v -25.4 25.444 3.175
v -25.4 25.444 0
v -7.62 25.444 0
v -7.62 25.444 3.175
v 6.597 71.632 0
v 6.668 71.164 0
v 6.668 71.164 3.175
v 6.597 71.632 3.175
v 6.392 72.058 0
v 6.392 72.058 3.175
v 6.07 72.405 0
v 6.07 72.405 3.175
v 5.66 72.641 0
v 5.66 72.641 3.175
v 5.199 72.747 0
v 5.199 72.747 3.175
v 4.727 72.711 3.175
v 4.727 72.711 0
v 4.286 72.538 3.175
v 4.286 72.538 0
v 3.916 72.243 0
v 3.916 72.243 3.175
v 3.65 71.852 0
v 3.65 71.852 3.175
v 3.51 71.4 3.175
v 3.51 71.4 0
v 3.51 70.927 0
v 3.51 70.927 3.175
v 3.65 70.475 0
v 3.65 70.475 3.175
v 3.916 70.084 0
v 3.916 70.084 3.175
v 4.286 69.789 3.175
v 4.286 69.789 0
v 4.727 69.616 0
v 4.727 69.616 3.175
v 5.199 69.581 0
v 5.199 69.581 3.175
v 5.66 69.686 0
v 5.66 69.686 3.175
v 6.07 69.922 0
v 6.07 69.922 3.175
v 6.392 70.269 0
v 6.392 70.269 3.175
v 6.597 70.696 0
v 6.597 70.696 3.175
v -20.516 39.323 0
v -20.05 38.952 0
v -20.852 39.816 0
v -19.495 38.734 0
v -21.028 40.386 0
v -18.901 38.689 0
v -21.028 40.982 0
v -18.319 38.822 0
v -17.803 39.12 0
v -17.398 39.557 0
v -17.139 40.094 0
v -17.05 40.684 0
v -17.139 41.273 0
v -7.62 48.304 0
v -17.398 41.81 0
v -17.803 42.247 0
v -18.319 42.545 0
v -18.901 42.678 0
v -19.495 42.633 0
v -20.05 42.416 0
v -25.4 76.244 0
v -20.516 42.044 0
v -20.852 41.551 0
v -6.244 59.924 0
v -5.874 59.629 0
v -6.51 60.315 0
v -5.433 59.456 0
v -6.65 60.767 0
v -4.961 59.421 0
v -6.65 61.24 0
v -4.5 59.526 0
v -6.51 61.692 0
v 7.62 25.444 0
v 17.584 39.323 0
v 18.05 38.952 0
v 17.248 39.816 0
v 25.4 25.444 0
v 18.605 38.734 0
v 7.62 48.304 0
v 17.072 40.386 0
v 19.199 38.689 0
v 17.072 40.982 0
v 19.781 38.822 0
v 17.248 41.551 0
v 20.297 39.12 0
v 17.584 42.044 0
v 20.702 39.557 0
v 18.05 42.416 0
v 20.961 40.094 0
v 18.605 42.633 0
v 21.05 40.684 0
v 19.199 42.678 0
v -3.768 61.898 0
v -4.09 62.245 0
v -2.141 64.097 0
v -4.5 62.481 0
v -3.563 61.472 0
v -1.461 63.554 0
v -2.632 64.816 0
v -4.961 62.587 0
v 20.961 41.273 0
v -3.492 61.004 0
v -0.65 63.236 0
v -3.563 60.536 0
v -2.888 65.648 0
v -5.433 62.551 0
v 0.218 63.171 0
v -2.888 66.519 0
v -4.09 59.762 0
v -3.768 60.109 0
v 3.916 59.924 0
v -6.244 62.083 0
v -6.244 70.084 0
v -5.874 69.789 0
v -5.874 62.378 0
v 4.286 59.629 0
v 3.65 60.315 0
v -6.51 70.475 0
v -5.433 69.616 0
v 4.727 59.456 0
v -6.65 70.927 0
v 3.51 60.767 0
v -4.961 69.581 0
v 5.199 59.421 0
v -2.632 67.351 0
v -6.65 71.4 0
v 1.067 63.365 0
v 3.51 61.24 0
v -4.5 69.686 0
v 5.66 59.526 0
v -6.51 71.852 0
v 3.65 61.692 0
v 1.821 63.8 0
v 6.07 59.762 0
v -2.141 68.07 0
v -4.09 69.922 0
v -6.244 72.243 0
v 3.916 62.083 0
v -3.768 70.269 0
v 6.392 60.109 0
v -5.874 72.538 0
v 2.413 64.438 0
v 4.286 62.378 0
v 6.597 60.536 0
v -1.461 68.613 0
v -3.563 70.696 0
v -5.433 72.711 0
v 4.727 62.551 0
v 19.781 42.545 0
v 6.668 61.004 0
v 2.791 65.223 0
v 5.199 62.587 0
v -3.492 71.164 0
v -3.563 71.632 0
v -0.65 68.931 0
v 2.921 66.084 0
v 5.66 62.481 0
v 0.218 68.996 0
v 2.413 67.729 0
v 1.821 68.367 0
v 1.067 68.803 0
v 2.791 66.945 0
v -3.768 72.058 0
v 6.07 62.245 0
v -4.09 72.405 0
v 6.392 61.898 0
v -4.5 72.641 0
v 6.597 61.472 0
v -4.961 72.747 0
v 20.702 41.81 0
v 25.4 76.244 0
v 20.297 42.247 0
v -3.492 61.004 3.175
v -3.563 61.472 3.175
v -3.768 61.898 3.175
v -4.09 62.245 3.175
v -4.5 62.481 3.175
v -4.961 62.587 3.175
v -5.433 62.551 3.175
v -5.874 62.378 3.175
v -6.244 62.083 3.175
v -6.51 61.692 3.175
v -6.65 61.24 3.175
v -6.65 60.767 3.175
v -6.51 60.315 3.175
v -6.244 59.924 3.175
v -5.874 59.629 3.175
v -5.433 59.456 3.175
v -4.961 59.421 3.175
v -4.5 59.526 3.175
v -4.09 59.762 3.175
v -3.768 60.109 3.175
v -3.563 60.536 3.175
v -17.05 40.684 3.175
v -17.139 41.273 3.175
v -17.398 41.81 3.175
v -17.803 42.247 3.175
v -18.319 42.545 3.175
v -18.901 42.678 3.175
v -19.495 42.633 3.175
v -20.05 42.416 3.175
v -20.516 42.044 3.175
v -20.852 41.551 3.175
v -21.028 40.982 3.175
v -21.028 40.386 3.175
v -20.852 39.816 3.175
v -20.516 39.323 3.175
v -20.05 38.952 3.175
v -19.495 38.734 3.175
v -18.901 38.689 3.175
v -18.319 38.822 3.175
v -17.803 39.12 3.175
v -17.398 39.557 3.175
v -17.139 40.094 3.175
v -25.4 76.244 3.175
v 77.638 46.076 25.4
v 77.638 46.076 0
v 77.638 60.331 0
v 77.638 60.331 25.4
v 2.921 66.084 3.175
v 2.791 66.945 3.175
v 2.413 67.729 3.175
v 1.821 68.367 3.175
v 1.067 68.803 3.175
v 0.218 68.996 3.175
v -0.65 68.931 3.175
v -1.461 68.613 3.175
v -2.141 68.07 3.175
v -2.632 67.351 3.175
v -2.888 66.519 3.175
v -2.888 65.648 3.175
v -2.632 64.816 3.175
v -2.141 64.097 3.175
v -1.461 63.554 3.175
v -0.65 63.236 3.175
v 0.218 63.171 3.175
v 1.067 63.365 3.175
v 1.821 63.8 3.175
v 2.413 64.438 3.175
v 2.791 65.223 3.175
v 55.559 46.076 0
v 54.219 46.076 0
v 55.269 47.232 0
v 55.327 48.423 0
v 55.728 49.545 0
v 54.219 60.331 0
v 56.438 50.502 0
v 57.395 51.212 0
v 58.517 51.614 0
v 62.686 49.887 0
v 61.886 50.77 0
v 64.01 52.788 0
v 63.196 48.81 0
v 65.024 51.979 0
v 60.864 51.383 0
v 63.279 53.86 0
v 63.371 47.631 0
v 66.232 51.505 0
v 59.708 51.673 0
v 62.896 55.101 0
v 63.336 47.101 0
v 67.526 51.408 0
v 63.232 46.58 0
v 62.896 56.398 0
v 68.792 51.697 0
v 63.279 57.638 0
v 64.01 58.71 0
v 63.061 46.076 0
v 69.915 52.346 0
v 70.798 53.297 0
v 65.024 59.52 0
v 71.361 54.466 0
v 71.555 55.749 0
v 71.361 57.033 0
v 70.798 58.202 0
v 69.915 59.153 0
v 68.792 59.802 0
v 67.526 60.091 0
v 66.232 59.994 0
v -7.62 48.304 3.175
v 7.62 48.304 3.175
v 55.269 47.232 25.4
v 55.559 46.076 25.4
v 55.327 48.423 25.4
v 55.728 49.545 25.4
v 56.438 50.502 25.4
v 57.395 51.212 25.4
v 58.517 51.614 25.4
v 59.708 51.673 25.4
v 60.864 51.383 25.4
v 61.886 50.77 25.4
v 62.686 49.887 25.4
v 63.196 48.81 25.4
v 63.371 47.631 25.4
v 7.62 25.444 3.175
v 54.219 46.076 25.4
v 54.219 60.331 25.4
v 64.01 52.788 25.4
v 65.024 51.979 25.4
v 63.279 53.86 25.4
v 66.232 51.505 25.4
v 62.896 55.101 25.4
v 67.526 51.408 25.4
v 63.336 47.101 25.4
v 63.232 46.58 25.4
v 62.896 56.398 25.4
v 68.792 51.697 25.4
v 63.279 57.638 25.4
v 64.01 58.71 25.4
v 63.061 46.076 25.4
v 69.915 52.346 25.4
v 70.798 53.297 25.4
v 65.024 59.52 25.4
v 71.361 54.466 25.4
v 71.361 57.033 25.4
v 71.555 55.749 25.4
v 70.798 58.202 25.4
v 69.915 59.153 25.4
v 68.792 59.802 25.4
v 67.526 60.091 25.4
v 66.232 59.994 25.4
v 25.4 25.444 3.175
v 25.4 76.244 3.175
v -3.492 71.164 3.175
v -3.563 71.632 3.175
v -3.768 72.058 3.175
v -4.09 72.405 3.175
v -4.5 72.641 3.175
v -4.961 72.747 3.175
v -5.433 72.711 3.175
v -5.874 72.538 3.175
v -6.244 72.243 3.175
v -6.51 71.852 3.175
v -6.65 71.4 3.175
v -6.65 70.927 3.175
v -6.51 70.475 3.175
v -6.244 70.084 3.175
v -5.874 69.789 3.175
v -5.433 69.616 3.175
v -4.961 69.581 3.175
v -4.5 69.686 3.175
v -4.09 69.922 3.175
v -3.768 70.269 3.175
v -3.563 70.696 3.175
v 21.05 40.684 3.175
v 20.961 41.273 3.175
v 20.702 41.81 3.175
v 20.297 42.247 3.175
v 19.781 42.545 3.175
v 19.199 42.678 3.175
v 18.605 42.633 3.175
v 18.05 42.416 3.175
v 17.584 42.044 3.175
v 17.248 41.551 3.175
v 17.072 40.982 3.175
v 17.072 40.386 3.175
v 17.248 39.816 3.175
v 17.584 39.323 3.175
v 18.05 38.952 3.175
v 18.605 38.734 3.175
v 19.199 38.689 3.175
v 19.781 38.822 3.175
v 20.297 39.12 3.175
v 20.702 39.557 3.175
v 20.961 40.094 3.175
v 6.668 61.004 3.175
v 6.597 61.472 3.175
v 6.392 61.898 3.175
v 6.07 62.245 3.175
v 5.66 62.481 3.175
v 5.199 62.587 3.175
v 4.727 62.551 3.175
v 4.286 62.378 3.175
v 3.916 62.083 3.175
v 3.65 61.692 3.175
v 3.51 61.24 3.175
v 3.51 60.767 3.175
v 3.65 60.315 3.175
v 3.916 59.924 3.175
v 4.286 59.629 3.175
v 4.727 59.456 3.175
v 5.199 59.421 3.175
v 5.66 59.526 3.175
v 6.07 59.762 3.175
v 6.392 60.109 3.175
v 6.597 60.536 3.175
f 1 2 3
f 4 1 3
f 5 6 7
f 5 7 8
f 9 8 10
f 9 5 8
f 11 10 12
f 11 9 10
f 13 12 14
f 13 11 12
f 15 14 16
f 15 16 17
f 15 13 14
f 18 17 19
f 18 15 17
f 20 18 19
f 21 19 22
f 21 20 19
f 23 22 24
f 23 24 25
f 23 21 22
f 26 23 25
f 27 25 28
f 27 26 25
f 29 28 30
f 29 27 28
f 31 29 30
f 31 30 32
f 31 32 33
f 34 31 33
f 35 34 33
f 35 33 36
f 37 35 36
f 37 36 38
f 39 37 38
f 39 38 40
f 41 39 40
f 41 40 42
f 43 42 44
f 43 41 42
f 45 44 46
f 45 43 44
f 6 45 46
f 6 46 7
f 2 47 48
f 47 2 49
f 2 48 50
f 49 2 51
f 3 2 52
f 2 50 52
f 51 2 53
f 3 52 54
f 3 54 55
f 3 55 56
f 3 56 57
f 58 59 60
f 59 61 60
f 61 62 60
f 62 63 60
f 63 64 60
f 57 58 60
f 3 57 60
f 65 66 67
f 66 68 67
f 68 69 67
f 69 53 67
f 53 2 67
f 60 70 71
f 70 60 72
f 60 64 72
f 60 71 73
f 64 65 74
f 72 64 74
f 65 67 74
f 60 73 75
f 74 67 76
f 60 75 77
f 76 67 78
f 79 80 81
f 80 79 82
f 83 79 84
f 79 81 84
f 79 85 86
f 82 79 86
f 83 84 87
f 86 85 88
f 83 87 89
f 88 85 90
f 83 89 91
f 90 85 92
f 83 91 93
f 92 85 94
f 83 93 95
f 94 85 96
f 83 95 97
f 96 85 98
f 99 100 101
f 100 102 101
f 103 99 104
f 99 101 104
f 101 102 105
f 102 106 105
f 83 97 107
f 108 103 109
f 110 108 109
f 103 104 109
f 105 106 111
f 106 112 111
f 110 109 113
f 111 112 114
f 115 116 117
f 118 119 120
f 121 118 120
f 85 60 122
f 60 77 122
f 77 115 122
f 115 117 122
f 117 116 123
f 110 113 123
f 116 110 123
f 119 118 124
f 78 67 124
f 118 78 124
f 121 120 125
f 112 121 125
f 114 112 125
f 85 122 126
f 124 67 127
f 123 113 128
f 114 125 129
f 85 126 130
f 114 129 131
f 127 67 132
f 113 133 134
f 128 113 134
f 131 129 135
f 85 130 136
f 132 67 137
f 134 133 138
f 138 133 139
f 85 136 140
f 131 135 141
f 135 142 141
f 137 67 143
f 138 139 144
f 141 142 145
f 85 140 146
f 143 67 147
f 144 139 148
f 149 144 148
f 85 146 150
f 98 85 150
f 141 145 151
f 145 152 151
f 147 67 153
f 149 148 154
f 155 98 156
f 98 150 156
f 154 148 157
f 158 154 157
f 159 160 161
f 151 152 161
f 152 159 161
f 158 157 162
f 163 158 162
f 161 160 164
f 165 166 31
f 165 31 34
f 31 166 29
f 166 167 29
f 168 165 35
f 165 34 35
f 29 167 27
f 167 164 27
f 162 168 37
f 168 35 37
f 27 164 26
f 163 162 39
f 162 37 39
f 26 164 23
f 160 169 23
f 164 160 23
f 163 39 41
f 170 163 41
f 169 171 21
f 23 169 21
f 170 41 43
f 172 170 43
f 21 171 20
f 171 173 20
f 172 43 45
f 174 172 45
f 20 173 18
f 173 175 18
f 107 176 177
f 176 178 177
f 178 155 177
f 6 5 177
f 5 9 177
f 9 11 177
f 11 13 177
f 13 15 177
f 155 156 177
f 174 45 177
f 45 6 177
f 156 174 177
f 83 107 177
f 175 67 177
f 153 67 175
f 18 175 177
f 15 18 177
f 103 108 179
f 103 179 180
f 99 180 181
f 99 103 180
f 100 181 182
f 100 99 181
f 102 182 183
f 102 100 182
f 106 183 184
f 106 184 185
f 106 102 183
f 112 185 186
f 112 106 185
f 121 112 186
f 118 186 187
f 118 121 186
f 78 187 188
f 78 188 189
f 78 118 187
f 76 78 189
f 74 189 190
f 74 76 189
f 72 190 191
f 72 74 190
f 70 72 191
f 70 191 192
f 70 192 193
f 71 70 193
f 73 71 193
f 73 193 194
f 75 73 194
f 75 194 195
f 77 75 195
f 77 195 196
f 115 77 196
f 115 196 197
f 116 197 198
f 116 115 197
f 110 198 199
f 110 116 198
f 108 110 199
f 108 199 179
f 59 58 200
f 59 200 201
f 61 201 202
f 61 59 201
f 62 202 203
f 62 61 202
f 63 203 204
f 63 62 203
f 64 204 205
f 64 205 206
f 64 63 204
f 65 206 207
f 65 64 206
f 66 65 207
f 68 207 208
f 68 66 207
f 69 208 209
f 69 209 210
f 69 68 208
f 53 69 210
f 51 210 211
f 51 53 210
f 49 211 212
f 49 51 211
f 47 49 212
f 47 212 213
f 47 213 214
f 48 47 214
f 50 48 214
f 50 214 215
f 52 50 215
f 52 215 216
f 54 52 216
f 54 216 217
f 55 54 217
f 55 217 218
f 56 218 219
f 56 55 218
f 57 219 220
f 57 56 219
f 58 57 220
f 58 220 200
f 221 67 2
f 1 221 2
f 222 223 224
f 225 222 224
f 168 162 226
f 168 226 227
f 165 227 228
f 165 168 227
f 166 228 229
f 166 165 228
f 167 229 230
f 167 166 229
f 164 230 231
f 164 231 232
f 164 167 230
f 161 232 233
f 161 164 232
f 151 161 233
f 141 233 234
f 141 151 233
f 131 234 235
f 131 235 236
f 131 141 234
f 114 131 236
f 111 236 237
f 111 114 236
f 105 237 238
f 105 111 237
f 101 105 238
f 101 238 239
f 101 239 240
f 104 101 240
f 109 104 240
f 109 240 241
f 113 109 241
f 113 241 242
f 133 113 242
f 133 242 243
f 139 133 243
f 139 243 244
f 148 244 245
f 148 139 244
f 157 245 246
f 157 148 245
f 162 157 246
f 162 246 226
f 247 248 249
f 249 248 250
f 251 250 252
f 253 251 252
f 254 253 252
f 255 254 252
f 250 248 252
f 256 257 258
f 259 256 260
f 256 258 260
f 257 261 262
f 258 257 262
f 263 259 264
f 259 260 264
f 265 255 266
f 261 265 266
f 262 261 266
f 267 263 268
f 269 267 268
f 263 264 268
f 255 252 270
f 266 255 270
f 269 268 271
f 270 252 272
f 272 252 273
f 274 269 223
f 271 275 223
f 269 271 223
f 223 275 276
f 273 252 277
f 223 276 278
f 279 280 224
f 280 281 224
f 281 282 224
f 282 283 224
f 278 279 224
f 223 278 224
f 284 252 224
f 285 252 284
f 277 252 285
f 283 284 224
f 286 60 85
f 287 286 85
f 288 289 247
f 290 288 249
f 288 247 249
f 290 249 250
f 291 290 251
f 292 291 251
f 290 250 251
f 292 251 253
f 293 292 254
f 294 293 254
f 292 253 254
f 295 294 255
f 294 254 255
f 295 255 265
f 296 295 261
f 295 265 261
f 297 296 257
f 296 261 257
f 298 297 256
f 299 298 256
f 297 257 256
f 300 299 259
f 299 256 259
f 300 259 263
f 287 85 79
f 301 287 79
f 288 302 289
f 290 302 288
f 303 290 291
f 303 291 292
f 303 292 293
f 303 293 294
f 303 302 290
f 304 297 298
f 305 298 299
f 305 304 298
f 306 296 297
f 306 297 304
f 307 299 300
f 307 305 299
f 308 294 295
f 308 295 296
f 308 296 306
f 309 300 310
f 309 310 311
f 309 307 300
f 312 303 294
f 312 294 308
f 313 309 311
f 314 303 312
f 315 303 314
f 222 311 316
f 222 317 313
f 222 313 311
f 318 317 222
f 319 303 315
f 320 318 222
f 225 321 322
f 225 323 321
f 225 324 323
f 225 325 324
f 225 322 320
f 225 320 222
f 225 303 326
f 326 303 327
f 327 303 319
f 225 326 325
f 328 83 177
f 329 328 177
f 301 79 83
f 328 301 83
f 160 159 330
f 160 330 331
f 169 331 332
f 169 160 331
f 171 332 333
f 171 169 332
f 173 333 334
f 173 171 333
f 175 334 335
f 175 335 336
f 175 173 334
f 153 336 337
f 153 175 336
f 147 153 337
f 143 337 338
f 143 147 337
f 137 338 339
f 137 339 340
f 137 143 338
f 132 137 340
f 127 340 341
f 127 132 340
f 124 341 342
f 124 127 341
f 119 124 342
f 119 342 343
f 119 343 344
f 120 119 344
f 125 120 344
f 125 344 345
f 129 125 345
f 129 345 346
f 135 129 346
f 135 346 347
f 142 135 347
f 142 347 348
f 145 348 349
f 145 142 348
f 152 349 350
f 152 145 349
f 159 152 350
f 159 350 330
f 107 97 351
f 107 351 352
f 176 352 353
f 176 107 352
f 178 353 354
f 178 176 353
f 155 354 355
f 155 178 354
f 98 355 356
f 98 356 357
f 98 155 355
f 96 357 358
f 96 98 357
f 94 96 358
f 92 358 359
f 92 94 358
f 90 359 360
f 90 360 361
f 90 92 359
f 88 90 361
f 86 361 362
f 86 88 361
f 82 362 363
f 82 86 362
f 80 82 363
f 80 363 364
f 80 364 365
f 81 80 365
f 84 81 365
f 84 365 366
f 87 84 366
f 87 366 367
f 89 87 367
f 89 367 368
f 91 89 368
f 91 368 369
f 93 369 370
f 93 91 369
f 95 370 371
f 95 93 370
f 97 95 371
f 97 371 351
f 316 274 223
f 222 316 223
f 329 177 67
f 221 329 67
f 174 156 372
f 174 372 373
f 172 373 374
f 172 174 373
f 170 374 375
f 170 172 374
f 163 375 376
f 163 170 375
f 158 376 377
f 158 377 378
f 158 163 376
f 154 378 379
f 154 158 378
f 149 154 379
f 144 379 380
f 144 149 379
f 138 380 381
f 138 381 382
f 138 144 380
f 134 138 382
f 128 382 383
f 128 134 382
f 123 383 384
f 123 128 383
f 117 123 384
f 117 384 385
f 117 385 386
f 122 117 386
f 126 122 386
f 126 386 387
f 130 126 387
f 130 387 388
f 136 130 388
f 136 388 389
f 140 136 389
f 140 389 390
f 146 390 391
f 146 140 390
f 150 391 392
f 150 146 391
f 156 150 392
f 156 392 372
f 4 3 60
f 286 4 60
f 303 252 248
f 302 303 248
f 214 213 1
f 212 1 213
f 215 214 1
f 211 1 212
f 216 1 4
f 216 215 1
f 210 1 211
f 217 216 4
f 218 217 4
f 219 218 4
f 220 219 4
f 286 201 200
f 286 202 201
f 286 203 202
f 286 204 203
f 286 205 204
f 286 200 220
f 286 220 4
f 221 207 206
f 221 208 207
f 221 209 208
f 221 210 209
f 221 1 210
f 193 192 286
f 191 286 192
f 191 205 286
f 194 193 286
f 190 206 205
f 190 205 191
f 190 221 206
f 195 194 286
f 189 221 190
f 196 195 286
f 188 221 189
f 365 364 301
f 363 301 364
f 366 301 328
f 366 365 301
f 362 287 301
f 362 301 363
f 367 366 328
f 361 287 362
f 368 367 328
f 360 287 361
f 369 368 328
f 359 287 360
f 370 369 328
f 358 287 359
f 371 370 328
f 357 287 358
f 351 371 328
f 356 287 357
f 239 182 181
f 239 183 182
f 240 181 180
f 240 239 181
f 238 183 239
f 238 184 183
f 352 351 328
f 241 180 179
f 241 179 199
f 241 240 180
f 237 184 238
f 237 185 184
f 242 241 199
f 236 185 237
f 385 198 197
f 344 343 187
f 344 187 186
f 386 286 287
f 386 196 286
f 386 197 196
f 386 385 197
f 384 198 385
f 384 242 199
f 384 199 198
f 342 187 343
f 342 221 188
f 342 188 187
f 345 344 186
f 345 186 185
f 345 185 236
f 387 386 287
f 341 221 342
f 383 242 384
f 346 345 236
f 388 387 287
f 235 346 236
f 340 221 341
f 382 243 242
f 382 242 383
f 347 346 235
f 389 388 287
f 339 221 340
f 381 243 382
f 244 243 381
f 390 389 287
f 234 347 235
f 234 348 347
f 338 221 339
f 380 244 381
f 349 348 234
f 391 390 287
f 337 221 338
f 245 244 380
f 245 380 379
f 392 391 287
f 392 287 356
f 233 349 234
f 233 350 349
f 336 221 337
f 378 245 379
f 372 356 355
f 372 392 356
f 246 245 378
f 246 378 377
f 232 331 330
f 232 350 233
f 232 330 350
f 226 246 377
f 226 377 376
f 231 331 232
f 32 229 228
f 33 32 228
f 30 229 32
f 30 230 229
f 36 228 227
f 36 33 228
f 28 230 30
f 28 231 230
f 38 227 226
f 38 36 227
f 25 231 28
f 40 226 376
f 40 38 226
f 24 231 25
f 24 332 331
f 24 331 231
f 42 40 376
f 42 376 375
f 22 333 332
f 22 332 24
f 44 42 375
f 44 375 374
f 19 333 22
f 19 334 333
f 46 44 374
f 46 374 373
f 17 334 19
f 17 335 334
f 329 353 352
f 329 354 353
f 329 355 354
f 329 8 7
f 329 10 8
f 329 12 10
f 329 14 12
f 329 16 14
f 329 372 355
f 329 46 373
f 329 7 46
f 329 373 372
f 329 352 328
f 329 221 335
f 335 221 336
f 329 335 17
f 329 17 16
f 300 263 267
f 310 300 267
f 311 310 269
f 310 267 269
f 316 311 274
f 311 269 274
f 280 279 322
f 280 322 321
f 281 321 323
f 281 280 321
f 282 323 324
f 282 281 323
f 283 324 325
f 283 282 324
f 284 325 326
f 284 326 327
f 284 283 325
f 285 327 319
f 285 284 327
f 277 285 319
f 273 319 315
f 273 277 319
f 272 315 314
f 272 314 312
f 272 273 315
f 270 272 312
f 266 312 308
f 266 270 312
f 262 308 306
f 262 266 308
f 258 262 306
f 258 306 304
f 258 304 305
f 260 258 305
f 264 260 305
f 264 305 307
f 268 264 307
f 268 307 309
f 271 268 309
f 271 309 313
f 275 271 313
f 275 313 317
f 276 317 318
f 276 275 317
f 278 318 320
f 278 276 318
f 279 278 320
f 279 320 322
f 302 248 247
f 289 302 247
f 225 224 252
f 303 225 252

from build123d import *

# Parameters (mm, degrees)
F0_R     = 2
F0_R_2   = 1.5875
F0_R_3   = 2.921
F1_DEPTH = 3.175
F0_R_4   = 4.3534644144
F2_DEPTH = 25.4


# Not quite as in the source:
# - a feature names something its author has since deleted; it is built from what else it names


with BuildPart() as f1:
    # F0 (on Top) → F1 (new body)
    with BuildSketch(Plane.XY):
        Polygon((-25.4, 76.2436284547), (-25.4, 25.4436284547), (-7.62, 25.4436284547), (-7.62, 48.3036284547), (7.62, 48.3036284547), (7.62, 25.4436284547), (25.4, 25.4436284547), (25.4, 76.2436284547), align=None)
        with Locations((-19.05, 40.6836284547)):
            Circle(F0_R, mode=Mode.SUBTRACT)
        with Locations((19.05, 40.6836284547)):
            Circle(F0_R, mode=Mode.SUBTRACT)
        with Locations((-5.08, 61.0036284547)):
            Circle(F0_R_2, mode=Mode.SUBTRACT)
        with Locations((5.08, 61.0036284547)):
            Circle(F0_R_2, mode=Mode.SUBTRACT)
        with Locations((0, 66.0836284547)):
            Circle(F0_R_3, mode=Mode.SUBTRACT)
        with Locations((-5.08, 71.1636284547)):
            Circle(F0_R_2, mode=Mode.SUBTRACT)
        with Locations((5.08, 71.1636284547)):
            Circle(F0_R_2, mode=Mode.SUBTRACT)
    extrude(amount=F1_DEPTH)


with BuildPart() as f2:
    # F0 (on Top) → F2 (new body)
    with BuildSketch(Plane.XY):
        with BuildLine():
            Line((77.6375979185, 60.3312589228), (54.219044745, 60.3312589228))
            Line((54.219044745, 60.3312589228), (54.219044745, 46.0764877498))
            Line((54.219044745, 46.0764877498), (55.5586186913, 46.0764877498))
            ThreePointArc((55.5586186913, 46.0764877498), (58.5174025864, 51.6139923023), (63.370874914, 47.6312589228))
            ThreePointArc((63.370874914, 47.6312589228), (63.2927672969, 46.8386275918), (63.0614491436, 46.0764877498))
            Line((63.0614491436, 46.0764877498), (77.6375979185, 46.0764877498))
            Line((77.6375979185, 46.0764877498), (77.6375979185, 60.3312589228))
        make_face()
        with Locations((67.2010704875, 55.7493679225)):
            Circle(F0_R_4, mode=Mode.SUBTRACT)
    extrude(amount=F2_DEPTH)


solid = Compound([f1.part, f2.part])
